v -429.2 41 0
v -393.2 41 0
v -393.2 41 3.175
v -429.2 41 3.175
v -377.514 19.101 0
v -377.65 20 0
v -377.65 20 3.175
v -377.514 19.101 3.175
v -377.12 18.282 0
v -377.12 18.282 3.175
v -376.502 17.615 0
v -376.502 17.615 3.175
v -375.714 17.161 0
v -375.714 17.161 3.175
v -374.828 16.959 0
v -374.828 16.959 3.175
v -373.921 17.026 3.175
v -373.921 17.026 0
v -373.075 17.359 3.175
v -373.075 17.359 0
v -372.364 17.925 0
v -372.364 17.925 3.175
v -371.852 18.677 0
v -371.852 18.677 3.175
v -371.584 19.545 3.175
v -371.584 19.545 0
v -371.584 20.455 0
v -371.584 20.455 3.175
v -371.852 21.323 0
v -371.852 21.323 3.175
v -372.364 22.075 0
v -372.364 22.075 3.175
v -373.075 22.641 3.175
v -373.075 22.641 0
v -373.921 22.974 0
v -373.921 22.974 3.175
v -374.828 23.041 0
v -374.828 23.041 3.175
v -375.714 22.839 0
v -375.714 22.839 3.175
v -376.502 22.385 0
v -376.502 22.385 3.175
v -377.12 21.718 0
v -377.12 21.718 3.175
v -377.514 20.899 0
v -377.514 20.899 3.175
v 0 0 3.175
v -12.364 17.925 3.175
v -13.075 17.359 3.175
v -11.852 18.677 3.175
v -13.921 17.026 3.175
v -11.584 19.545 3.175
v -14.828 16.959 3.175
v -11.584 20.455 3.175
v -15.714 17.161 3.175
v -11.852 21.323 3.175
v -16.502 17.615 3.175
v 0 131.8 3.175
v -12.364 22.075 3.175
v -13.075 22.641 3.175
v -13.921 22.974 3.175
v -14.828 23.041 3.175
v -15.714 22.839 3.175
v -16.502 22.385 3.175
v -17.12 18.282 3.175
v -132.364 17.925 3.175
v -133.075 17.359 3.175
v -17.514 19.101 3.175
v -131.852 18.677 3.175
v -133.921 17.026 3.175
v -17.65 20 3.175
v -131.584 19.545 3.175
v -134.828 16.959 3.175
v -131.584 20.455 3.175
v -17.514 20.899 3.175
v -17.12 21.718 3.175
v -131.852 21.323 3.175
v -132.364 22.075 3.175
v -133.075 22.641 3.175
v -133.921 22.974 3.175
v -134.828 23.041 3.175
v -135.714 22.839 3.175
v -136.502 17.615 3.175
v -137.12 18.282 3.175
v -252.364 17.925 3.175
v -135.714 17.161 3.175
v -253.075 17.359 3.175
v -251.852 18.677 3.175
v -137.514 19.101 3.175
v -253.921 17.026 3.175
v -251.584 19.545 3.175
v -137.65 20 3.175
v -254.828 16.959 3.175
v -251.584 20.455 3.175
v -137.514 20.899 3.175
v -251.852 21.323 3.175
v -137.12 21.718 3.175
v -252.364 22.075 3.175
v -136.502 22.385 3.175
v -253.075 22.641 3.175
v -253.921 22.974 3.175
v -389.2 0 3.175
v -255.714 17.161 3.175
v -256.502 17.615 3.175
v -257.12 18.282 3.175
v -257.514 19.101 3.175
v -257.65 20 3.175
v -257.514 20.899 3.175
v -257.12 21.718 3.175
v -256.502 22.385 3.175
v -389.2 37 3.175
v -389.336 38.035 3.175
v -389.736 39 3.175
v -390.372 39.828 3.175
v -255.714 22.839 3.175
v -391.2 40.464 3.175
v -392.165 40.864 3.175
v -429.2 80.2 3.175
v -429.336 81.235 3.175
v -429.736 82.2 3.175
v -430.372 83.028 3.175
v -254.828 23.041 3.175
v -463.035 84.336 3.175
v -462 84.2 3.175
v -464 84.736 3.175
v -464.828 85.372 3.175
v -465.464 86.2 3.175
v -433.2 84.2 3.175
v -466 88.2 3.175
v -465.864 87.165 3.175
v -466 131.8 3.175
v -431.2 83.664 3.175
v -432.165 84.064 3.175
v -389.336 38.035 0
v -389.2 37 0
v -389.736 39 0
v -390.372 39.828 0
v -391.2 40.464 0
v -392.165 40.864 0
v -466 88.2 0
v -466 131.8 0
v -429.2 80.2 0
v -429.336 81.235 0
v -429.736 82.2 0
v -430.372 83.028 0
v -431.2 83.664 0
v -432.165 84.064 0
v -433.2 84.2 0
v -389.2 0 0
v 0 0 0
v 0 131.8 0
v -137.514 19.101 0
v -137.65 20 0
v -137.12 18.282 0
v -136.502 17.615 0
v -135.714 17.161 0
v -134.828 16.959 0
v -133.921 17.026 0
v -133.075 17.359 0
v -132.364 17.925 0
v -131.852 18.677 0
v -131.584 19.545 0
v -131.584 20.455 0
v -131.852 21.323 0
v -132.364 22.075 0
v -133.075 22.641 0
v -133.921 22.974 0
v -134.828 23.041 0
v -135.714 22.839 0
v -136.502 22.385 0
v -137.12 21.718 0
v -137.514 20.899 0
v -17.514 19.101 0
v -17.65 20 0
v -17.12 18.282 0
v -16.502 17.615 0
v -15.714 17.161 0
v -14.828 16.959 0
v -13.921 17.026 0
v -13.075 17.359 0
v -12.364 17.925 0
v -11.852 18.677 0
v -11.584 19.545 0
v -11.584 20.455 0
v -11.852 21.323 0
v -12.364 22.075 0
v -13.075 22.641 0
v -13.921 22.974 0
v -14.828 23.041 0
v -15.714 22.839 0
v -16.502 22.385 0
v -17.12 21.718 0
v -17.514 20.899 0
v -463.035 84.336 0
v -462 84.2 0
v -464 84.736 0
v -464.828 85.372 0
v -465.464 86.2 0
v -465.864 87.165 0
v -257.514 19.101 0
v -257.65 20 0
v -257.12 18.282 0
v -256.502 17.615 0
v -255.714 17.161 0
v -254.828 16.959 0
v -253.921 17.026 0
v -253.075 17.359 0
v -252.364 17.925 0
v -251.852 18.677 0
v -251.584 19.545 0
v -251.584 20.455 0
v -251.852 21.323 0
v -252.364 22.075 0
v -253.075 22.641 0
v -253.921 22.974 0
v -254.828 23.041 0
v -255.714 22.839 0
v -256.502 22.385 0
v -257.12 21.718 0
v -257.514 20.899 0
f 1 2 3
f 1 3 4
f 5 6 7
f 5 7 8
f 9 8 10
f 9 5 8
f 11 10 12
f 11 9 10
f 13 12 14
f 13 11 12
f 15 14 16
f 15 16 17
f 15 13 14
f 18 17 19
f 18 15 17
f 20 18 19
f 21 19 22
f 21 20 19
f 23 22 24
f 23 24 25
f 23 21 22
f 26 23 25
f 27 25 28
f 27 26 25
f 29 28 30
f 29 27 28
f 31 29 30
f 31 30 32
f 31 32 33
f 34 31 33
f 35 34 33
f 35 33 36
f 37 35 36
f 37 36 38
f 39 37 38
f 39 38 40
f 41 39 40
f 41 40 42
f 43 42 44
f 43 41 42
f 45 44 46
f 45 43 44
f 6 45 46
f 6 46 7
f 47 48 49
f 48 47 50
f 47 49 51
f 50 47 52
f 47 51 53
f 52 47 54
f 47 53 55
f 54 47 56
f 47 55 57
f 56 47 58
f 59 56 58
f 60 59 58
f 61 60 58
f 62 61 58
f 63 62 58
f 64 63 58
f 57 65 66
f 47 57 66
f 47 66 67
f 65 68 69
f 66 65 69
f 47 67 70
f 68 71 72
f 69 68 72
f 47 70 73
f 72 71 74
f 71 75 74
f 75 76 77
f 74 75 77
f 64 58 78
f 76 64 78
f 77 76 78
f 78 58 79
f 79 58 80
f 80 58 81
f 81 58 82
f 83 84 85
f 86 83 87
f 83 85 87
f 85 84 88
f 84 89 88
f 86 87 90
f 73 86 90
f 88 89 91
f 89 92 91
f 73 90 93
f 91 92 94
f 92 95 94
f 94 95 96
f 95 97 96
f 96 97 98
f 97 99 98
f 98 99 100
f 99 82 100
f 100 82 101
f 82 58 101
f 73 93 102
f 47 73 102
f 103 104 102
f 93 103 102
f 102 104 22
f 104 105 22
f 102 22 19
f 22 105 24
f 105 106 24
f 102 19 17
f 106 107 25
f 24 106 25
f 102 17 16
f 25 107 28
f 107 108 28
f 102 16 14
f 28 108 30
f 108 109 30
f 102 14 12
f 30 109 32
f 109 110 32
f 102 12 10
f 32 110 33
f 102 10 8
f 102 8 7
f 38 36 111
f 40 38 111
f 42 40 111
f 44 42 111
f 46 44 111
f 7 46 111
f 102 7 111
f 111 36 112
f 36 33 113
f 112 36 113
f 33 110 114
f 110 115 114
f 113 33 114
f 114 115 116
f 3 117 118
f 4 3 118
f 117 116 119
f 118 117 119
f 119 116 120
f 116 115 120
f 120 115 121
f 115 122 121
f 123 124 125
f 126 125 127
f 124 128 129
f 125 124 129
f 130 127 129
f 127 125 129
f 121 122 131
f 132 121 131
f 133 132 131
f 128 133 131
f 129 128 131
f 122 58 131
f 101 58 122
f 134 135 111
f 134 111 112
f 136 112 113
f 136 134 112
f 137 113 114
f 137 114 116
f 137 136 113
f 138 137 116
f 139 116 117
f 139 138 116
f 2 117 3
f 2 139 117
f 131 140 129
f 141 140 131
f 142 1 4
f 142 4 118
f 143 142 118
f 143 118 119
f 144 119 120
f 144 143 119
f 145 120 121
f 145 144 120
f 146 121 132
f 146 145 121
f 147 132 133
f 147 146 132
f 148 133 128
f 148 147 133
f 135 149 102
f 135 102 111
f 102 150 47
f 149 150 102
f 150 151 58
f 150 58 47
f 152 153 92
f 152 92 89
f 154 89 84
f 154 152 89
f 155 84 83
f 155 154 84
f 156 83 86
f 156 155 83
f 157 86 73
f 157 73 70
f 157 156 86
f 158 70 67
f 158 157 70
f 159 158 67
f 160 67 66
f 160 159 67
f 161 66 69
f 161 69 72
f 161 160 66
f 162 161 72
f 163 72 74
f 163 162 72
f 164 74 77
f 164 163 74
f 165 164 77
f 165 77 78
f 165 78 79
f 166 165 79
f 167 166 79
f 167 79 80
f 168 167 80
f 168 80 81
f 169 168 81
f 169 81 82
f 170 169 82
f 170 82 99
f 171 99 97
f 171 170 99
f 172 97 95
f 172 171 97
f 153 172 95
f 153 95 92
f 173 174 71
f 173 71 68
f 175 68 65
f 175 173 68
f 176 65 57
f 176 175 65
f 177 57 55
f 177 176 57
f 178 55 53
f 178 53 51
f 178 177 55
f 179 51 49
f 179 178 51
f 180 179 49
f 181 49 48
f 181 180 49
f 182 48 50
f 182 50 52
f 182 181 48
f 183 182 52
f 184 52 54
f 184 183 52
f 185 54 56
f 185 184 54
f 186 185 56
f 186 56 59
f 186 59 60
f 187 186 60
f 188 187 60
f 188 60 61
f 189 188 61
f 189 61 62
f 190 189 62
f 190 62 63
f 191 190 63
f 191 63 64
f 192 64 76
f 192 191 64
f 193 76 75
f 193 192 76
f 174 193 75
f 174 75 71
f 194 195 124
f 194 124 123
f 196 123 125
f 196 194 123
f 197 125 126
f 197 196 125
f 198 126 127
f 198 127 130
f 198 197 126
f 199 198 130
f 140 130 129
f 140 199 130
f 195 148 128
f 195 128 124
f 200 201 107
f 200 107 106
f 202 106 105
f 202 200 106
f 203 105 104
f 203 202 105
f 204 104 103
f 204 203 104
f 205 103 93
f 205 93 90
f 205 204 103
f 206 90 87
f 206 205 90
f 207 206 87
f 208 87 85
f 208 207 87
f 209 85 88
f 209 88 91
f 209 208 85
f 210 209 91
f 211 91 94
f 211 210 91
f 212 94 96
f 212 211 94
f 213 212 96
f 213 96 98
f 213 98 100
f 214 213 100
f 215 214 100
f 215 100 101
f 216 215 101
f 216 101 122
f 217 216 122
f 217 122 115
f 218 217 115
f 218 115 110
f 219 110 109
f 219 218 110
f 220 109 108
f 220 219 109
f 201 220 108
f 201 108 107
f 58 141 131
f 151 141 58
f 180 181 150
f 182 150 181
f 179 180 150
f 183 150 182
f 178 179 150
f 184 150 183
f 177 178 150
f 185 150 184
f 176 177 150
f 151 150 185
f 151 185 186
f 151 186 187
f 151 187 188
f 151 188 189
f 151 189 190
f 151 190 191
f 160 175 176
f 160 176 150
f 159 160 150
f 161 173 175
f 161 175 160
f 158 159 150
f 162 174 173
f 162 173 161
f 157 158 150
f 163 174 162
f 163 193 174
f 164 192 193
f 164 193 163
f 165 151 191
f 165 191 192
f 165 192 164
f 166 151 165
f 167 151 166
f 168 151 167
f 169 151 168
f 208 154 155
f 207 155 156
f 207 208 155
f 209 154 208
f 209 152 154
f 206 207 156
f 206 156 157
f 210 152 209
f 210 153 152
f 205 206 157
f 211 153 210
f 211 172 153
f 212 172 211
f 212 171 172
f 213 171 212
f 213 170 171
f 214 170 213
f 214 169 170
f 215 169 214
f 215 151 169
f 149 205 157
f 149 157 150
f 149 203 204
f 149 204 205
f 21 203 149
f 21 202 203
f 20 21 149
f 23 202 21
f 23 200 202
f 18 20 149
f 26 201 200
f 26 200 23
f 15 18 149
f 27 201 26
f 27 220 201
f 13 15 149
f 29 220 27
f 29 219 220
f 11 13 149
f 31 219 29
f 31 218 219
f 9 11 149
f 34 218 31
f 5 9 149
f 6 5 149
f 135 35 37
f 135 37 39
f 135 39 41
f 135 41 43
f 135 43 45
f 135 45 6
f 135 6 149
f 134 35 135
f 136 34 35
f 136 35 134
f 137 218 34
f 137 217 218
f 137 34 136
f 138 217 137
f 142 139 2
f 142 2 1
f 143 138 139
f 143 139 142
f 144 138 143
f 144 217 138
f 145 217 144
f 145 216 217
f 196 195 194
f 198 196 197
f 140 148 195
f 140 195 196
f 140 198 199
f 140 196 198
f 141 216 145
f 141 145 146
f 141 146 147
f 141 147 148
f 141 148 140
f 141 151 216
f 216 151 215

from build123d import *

# Parameters (mm, degrees)
SKETCH1_R           = 3.05
BOSS_EXTRUDE1_DEPTH = 3.175


with BuildPart() as part:
    # Sketch1 → Boss-Extrude1 (new body)
    with BuildSketch(Plane.XY):
        with BuildLine():
            Line((-466, 88.2), (-466, 131.8))
            Line((-466, 131.8), (0, 131.8))
            Line((0, 131.8), (0, 0))
            Line((0, 0), (-389.2, 0))
            Line((-389.2, 0), (-389.2, 37))
            ThreePointArc((-389.2, 37), (-390.371572875, 39.828427125), (-393.2, 41))
            Line((-393.2, 41), (-429.2, 41))
            Line((-429.2, 41), (-429.2, 80.2))
            ThreePointArc((-429.2, 80.2), (-430.371572875, 83.028427125), (-433.2, 84.2))
            Line((-433.2, 84.2), (-462, 84.2))
            ThreePointArc((-462, 84.2), (-464.828427125, 85.371572875), (-466, 88.2))
        make_face()
        with Locations(Location((-14.6, 20, 0), (0, 0, 180))):
            Circle(SKETCH1_R, mode=Mode.SUBTRACT)
        with Locations(Location((-134.6, 20, 0), (0, 0, 180))):
            Circle(SKETCH1_R, mode=Mode.SUBTRACT)
        with Locations(Location((-254.6, 20, 0), (0, 0, 180))):
            Circle(SKETCH1_R, mode=Mode.SUBTRACT)
        with Locations(Location((-374.6, 20, 0), (0, 0, 180))):
            Circle(SKETCH1_R, mode=Mode.SUBTRACT)
    extrude(amount=BOSS_EXTRUDE1_DEPTH)


solid = part.part
